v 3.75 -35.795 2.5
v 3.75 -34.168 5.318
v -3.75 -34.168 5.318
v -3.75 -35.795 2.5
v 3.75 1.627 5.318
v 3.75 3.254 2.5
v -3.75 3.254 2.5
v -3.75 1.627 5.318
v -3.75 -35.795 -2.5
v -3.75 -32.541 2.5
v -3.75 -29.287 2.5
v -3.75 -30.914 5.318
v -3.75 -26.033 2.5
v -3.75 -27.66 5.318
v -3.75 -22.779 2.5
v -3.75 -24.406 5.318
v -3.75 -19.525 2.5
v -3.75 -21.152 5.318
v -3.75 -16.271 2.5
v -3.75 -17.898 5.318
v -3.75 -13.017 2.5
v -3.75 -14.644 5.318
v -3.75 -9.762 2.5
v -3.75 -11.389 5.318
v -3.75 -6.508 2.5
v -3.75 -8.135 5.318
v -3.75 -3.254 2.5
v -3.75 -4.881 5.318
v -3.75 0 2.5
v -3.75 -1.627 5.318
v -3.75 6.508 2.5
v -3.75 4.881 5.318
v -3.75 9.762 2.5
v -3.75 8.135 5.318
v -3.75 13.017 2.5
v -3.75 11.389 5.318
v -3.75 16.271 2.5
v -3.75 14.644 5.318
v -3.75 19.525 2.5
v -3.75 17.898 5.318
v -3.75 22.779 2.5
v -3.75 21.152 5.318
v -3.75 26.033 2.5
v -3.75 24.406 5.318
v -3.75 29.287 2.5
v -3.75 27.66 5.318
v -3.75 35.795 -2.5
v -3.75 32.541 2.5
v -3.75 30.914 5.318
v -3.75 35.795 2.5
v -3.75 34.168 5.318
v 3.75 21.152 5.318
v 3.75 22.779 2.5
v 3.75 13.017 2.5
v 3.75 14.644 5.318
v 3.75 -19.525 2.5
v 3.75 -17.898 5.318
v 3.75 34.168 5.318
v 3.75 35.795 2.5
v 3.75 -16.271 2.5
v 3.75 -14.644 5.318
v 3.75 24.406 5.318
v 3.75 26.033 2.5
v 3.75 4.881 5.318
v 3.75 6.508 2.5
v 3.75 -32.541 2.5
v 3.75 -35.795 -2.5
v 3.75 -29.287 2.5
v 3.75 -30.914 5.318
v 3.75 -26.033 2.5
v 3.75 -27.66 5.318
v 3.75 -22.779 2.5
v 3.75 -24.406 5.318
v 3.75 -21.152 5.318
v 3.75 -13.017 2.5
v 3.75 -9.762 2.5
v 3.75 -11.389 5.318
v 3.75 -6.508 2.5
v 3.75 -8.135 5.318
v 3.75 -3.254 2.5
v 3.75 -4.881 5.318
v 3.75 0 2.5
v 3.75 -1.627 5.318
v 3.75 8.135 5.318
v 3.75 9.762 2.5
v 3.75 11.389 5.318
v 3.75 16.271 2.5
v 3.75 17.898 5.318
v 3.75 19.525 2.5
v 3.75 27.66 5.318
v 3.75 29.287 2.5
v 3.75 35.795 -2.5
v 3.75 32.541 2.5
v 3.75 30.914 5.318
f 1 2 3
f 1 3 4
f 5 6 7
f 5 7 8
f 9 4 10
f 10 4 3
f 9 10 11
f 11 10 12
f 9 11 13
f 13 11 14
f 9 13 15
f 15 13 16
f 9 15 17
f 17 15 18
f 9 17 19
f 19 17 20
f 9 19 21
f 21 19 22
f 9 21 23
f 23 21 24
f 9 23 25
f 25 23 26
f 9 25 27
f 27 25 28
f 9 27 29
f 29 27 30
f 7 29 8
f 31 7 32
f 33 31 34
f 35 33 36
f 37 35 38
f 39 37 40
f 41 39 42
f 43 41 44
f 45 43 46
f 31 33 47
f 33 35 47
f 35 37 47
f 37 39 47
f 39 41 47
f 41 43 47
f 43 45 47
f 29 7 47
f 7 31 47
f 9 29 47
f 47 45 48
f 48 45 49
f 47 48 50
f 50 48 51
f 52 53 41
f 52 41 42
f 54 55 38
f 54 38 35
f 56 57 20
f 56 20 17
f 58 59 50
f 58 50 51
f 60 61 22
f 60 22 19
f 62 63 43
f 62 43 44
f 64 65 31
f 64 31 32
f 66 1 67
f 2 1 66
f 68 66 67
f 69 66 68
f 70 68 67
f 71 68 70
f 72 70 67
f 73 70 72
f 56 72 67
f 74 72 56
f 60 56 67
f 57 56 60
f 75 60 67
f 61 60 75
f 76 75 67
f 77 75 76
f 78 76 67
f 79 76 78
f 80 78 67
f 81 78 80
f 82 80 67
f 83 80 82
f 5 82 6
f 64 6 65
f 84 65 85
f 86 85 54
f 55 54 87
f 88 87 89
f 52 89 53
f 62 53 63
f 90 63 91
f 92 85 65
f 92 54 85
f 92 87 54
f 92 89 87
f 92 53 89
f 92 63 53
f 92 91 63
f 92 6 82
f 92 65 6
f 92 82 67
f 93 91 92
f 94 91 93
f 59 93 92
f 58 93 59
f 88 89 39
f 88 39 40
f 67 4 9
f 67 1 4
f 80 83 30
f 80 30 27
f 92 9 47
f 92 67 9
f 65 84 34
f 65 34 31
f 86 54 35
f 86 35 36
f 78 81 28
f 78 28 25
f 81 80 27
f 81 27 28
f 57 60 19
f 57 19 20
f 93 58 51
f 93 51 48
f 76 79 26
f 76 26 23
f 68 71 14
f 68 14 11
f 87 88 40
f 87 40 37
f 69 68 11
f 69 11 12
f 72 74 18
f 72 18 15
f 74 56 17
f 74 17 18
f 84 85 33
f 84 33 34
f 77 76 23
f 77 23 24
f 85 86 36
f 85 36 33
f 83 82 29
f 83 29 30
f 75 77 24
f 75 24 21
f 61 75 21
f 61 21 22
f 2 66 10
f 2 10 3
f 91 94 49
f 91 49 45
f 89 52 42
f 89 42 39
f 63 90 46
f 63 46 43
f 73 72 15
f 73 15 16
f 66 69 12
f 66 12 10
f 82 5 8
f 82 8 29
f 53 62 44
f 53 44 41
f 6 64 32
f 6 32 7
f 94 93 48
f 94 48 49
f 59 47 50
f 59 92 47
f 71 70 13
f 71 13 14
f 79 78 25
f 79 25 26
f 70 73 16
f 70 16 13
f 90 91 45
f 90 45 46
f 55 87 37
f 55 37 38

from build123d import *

# Parameters (mm, degrees)
F1_DEPTH = 3.75


with BuildPart() as f1:
    # F0 (on Right) → F1 (new body, symmetric)
    with BuildSketch(Plane.YZ):
        Polygon((35.795455, -2.5), (35.795455, 2.5), (32.541322, 2.5), (29.28719, 2.5), (26.033058, 2.5), (22.778926, 2.5), (19.524793, 2.5), (16.270661, 2.5), (13.016529, 2.5), (9.762397, 2.5), (6.508264, 2.5), (3.254132, 2.5), (0, 2.5), (-3.254132, 2.5), (-6.508264, 2.5), (-9.762397, 2.5), (-13.016529, 2.5), (-16.270661, 2.5), (-19.524793, 2.5), (-22.778926, 2.5), (-26.033058, 2.5), (-29.28719, 2.5), (-32.541322, 2.5), (-35.795455, 2.5), (-35.795455, -2.5), align=None)
        Polygon((26.033058, 2.5), (29.28719, 2.5), (27.660124, 5.318161), align=None)
        Polygon((29.28719, 2.5), (32.541322, 2.5), (30.914256, 5.318161), align=None)
        Polygon((32.541322, 2.5), (35.795455, 2.5), (34.168388, 5.318161), align=None)
        Polygon((13.016529, 2.5), (16.270661, 2.5), (14.643595, 5.318161), align=None)
        Polygon((6.508264, 2.5), (9.762397, 2.5), (8.135331, 5.318161), align=None)
        Polygon((16.270661, 2.5), (19.524793, 2.5), (17.897727, 5.318161), align=None)
        Polygon((9.762397, 2.5), (13.016529, 2.5), (11.389463, 5.318161), align=None)
        Polygon((-34.168388, 5.318161), (-35.795455, 2.5), (-32.541322, 2.5), align=None)
        Polygon((-30.914256, 5.318161), (-32.541322, 2.5), (-29.28719, 2.5), align=None)
        Polygon((-27.660124, 5.318161), (-29.28719, 2.5), (-26.033058, 2.5), align=None)
        Polygon((-24.405992, 5.318161), (-26.033058, 2.5), (-22.778926, 2.5), align=None)
        Polygon((-21.15186, 5.318161), (-22.778926, 2.5), (-19.524793, 2.5), align=None)
        Polygon((-17.897727, 5.318161), (-19.524793, 2.5), (-16.270661, 2.5), align=None)
        Polygon((-14.643595, 5.318161), (-16.270661, 2.5), (-13.016529, 2.5), align=None)
        Polygon((-11.389463, 5.318161), (-13.016529, 2.5), (-9.762397, 2.5), align=None)
        Polygon((-8.135331, 5.318161), (-9.762397, 2.5), (-6.508264, 2.5), align=None)
        Polygon((-6.508264, 2.5), (-3.254132, 2.5), (-4.881198, 5.318161), align=None)
        Polygon((-3.254132, 2.5), (0, 2.5), (-1.627066, 5.318161), align=None)
        Polygon((0, 2.5), (3.254132, 2.5), (1.627066, 5.318161), align=None)
        Polygon((3.254132, 2.5), (6.508264, 2.5), (4.881198, 5.318161), align=None)
        Polygon((19.524793, 2.5), (22.778926, 2.5), (21.15186, 5.318161), align=None)
        Polygon((22.778926, 2.5), (26.033058, 2.5), (24.405992, 5.318161), align=None)
    extrude(amount=F1_DEPTH, both=True)


solid = f1.part
